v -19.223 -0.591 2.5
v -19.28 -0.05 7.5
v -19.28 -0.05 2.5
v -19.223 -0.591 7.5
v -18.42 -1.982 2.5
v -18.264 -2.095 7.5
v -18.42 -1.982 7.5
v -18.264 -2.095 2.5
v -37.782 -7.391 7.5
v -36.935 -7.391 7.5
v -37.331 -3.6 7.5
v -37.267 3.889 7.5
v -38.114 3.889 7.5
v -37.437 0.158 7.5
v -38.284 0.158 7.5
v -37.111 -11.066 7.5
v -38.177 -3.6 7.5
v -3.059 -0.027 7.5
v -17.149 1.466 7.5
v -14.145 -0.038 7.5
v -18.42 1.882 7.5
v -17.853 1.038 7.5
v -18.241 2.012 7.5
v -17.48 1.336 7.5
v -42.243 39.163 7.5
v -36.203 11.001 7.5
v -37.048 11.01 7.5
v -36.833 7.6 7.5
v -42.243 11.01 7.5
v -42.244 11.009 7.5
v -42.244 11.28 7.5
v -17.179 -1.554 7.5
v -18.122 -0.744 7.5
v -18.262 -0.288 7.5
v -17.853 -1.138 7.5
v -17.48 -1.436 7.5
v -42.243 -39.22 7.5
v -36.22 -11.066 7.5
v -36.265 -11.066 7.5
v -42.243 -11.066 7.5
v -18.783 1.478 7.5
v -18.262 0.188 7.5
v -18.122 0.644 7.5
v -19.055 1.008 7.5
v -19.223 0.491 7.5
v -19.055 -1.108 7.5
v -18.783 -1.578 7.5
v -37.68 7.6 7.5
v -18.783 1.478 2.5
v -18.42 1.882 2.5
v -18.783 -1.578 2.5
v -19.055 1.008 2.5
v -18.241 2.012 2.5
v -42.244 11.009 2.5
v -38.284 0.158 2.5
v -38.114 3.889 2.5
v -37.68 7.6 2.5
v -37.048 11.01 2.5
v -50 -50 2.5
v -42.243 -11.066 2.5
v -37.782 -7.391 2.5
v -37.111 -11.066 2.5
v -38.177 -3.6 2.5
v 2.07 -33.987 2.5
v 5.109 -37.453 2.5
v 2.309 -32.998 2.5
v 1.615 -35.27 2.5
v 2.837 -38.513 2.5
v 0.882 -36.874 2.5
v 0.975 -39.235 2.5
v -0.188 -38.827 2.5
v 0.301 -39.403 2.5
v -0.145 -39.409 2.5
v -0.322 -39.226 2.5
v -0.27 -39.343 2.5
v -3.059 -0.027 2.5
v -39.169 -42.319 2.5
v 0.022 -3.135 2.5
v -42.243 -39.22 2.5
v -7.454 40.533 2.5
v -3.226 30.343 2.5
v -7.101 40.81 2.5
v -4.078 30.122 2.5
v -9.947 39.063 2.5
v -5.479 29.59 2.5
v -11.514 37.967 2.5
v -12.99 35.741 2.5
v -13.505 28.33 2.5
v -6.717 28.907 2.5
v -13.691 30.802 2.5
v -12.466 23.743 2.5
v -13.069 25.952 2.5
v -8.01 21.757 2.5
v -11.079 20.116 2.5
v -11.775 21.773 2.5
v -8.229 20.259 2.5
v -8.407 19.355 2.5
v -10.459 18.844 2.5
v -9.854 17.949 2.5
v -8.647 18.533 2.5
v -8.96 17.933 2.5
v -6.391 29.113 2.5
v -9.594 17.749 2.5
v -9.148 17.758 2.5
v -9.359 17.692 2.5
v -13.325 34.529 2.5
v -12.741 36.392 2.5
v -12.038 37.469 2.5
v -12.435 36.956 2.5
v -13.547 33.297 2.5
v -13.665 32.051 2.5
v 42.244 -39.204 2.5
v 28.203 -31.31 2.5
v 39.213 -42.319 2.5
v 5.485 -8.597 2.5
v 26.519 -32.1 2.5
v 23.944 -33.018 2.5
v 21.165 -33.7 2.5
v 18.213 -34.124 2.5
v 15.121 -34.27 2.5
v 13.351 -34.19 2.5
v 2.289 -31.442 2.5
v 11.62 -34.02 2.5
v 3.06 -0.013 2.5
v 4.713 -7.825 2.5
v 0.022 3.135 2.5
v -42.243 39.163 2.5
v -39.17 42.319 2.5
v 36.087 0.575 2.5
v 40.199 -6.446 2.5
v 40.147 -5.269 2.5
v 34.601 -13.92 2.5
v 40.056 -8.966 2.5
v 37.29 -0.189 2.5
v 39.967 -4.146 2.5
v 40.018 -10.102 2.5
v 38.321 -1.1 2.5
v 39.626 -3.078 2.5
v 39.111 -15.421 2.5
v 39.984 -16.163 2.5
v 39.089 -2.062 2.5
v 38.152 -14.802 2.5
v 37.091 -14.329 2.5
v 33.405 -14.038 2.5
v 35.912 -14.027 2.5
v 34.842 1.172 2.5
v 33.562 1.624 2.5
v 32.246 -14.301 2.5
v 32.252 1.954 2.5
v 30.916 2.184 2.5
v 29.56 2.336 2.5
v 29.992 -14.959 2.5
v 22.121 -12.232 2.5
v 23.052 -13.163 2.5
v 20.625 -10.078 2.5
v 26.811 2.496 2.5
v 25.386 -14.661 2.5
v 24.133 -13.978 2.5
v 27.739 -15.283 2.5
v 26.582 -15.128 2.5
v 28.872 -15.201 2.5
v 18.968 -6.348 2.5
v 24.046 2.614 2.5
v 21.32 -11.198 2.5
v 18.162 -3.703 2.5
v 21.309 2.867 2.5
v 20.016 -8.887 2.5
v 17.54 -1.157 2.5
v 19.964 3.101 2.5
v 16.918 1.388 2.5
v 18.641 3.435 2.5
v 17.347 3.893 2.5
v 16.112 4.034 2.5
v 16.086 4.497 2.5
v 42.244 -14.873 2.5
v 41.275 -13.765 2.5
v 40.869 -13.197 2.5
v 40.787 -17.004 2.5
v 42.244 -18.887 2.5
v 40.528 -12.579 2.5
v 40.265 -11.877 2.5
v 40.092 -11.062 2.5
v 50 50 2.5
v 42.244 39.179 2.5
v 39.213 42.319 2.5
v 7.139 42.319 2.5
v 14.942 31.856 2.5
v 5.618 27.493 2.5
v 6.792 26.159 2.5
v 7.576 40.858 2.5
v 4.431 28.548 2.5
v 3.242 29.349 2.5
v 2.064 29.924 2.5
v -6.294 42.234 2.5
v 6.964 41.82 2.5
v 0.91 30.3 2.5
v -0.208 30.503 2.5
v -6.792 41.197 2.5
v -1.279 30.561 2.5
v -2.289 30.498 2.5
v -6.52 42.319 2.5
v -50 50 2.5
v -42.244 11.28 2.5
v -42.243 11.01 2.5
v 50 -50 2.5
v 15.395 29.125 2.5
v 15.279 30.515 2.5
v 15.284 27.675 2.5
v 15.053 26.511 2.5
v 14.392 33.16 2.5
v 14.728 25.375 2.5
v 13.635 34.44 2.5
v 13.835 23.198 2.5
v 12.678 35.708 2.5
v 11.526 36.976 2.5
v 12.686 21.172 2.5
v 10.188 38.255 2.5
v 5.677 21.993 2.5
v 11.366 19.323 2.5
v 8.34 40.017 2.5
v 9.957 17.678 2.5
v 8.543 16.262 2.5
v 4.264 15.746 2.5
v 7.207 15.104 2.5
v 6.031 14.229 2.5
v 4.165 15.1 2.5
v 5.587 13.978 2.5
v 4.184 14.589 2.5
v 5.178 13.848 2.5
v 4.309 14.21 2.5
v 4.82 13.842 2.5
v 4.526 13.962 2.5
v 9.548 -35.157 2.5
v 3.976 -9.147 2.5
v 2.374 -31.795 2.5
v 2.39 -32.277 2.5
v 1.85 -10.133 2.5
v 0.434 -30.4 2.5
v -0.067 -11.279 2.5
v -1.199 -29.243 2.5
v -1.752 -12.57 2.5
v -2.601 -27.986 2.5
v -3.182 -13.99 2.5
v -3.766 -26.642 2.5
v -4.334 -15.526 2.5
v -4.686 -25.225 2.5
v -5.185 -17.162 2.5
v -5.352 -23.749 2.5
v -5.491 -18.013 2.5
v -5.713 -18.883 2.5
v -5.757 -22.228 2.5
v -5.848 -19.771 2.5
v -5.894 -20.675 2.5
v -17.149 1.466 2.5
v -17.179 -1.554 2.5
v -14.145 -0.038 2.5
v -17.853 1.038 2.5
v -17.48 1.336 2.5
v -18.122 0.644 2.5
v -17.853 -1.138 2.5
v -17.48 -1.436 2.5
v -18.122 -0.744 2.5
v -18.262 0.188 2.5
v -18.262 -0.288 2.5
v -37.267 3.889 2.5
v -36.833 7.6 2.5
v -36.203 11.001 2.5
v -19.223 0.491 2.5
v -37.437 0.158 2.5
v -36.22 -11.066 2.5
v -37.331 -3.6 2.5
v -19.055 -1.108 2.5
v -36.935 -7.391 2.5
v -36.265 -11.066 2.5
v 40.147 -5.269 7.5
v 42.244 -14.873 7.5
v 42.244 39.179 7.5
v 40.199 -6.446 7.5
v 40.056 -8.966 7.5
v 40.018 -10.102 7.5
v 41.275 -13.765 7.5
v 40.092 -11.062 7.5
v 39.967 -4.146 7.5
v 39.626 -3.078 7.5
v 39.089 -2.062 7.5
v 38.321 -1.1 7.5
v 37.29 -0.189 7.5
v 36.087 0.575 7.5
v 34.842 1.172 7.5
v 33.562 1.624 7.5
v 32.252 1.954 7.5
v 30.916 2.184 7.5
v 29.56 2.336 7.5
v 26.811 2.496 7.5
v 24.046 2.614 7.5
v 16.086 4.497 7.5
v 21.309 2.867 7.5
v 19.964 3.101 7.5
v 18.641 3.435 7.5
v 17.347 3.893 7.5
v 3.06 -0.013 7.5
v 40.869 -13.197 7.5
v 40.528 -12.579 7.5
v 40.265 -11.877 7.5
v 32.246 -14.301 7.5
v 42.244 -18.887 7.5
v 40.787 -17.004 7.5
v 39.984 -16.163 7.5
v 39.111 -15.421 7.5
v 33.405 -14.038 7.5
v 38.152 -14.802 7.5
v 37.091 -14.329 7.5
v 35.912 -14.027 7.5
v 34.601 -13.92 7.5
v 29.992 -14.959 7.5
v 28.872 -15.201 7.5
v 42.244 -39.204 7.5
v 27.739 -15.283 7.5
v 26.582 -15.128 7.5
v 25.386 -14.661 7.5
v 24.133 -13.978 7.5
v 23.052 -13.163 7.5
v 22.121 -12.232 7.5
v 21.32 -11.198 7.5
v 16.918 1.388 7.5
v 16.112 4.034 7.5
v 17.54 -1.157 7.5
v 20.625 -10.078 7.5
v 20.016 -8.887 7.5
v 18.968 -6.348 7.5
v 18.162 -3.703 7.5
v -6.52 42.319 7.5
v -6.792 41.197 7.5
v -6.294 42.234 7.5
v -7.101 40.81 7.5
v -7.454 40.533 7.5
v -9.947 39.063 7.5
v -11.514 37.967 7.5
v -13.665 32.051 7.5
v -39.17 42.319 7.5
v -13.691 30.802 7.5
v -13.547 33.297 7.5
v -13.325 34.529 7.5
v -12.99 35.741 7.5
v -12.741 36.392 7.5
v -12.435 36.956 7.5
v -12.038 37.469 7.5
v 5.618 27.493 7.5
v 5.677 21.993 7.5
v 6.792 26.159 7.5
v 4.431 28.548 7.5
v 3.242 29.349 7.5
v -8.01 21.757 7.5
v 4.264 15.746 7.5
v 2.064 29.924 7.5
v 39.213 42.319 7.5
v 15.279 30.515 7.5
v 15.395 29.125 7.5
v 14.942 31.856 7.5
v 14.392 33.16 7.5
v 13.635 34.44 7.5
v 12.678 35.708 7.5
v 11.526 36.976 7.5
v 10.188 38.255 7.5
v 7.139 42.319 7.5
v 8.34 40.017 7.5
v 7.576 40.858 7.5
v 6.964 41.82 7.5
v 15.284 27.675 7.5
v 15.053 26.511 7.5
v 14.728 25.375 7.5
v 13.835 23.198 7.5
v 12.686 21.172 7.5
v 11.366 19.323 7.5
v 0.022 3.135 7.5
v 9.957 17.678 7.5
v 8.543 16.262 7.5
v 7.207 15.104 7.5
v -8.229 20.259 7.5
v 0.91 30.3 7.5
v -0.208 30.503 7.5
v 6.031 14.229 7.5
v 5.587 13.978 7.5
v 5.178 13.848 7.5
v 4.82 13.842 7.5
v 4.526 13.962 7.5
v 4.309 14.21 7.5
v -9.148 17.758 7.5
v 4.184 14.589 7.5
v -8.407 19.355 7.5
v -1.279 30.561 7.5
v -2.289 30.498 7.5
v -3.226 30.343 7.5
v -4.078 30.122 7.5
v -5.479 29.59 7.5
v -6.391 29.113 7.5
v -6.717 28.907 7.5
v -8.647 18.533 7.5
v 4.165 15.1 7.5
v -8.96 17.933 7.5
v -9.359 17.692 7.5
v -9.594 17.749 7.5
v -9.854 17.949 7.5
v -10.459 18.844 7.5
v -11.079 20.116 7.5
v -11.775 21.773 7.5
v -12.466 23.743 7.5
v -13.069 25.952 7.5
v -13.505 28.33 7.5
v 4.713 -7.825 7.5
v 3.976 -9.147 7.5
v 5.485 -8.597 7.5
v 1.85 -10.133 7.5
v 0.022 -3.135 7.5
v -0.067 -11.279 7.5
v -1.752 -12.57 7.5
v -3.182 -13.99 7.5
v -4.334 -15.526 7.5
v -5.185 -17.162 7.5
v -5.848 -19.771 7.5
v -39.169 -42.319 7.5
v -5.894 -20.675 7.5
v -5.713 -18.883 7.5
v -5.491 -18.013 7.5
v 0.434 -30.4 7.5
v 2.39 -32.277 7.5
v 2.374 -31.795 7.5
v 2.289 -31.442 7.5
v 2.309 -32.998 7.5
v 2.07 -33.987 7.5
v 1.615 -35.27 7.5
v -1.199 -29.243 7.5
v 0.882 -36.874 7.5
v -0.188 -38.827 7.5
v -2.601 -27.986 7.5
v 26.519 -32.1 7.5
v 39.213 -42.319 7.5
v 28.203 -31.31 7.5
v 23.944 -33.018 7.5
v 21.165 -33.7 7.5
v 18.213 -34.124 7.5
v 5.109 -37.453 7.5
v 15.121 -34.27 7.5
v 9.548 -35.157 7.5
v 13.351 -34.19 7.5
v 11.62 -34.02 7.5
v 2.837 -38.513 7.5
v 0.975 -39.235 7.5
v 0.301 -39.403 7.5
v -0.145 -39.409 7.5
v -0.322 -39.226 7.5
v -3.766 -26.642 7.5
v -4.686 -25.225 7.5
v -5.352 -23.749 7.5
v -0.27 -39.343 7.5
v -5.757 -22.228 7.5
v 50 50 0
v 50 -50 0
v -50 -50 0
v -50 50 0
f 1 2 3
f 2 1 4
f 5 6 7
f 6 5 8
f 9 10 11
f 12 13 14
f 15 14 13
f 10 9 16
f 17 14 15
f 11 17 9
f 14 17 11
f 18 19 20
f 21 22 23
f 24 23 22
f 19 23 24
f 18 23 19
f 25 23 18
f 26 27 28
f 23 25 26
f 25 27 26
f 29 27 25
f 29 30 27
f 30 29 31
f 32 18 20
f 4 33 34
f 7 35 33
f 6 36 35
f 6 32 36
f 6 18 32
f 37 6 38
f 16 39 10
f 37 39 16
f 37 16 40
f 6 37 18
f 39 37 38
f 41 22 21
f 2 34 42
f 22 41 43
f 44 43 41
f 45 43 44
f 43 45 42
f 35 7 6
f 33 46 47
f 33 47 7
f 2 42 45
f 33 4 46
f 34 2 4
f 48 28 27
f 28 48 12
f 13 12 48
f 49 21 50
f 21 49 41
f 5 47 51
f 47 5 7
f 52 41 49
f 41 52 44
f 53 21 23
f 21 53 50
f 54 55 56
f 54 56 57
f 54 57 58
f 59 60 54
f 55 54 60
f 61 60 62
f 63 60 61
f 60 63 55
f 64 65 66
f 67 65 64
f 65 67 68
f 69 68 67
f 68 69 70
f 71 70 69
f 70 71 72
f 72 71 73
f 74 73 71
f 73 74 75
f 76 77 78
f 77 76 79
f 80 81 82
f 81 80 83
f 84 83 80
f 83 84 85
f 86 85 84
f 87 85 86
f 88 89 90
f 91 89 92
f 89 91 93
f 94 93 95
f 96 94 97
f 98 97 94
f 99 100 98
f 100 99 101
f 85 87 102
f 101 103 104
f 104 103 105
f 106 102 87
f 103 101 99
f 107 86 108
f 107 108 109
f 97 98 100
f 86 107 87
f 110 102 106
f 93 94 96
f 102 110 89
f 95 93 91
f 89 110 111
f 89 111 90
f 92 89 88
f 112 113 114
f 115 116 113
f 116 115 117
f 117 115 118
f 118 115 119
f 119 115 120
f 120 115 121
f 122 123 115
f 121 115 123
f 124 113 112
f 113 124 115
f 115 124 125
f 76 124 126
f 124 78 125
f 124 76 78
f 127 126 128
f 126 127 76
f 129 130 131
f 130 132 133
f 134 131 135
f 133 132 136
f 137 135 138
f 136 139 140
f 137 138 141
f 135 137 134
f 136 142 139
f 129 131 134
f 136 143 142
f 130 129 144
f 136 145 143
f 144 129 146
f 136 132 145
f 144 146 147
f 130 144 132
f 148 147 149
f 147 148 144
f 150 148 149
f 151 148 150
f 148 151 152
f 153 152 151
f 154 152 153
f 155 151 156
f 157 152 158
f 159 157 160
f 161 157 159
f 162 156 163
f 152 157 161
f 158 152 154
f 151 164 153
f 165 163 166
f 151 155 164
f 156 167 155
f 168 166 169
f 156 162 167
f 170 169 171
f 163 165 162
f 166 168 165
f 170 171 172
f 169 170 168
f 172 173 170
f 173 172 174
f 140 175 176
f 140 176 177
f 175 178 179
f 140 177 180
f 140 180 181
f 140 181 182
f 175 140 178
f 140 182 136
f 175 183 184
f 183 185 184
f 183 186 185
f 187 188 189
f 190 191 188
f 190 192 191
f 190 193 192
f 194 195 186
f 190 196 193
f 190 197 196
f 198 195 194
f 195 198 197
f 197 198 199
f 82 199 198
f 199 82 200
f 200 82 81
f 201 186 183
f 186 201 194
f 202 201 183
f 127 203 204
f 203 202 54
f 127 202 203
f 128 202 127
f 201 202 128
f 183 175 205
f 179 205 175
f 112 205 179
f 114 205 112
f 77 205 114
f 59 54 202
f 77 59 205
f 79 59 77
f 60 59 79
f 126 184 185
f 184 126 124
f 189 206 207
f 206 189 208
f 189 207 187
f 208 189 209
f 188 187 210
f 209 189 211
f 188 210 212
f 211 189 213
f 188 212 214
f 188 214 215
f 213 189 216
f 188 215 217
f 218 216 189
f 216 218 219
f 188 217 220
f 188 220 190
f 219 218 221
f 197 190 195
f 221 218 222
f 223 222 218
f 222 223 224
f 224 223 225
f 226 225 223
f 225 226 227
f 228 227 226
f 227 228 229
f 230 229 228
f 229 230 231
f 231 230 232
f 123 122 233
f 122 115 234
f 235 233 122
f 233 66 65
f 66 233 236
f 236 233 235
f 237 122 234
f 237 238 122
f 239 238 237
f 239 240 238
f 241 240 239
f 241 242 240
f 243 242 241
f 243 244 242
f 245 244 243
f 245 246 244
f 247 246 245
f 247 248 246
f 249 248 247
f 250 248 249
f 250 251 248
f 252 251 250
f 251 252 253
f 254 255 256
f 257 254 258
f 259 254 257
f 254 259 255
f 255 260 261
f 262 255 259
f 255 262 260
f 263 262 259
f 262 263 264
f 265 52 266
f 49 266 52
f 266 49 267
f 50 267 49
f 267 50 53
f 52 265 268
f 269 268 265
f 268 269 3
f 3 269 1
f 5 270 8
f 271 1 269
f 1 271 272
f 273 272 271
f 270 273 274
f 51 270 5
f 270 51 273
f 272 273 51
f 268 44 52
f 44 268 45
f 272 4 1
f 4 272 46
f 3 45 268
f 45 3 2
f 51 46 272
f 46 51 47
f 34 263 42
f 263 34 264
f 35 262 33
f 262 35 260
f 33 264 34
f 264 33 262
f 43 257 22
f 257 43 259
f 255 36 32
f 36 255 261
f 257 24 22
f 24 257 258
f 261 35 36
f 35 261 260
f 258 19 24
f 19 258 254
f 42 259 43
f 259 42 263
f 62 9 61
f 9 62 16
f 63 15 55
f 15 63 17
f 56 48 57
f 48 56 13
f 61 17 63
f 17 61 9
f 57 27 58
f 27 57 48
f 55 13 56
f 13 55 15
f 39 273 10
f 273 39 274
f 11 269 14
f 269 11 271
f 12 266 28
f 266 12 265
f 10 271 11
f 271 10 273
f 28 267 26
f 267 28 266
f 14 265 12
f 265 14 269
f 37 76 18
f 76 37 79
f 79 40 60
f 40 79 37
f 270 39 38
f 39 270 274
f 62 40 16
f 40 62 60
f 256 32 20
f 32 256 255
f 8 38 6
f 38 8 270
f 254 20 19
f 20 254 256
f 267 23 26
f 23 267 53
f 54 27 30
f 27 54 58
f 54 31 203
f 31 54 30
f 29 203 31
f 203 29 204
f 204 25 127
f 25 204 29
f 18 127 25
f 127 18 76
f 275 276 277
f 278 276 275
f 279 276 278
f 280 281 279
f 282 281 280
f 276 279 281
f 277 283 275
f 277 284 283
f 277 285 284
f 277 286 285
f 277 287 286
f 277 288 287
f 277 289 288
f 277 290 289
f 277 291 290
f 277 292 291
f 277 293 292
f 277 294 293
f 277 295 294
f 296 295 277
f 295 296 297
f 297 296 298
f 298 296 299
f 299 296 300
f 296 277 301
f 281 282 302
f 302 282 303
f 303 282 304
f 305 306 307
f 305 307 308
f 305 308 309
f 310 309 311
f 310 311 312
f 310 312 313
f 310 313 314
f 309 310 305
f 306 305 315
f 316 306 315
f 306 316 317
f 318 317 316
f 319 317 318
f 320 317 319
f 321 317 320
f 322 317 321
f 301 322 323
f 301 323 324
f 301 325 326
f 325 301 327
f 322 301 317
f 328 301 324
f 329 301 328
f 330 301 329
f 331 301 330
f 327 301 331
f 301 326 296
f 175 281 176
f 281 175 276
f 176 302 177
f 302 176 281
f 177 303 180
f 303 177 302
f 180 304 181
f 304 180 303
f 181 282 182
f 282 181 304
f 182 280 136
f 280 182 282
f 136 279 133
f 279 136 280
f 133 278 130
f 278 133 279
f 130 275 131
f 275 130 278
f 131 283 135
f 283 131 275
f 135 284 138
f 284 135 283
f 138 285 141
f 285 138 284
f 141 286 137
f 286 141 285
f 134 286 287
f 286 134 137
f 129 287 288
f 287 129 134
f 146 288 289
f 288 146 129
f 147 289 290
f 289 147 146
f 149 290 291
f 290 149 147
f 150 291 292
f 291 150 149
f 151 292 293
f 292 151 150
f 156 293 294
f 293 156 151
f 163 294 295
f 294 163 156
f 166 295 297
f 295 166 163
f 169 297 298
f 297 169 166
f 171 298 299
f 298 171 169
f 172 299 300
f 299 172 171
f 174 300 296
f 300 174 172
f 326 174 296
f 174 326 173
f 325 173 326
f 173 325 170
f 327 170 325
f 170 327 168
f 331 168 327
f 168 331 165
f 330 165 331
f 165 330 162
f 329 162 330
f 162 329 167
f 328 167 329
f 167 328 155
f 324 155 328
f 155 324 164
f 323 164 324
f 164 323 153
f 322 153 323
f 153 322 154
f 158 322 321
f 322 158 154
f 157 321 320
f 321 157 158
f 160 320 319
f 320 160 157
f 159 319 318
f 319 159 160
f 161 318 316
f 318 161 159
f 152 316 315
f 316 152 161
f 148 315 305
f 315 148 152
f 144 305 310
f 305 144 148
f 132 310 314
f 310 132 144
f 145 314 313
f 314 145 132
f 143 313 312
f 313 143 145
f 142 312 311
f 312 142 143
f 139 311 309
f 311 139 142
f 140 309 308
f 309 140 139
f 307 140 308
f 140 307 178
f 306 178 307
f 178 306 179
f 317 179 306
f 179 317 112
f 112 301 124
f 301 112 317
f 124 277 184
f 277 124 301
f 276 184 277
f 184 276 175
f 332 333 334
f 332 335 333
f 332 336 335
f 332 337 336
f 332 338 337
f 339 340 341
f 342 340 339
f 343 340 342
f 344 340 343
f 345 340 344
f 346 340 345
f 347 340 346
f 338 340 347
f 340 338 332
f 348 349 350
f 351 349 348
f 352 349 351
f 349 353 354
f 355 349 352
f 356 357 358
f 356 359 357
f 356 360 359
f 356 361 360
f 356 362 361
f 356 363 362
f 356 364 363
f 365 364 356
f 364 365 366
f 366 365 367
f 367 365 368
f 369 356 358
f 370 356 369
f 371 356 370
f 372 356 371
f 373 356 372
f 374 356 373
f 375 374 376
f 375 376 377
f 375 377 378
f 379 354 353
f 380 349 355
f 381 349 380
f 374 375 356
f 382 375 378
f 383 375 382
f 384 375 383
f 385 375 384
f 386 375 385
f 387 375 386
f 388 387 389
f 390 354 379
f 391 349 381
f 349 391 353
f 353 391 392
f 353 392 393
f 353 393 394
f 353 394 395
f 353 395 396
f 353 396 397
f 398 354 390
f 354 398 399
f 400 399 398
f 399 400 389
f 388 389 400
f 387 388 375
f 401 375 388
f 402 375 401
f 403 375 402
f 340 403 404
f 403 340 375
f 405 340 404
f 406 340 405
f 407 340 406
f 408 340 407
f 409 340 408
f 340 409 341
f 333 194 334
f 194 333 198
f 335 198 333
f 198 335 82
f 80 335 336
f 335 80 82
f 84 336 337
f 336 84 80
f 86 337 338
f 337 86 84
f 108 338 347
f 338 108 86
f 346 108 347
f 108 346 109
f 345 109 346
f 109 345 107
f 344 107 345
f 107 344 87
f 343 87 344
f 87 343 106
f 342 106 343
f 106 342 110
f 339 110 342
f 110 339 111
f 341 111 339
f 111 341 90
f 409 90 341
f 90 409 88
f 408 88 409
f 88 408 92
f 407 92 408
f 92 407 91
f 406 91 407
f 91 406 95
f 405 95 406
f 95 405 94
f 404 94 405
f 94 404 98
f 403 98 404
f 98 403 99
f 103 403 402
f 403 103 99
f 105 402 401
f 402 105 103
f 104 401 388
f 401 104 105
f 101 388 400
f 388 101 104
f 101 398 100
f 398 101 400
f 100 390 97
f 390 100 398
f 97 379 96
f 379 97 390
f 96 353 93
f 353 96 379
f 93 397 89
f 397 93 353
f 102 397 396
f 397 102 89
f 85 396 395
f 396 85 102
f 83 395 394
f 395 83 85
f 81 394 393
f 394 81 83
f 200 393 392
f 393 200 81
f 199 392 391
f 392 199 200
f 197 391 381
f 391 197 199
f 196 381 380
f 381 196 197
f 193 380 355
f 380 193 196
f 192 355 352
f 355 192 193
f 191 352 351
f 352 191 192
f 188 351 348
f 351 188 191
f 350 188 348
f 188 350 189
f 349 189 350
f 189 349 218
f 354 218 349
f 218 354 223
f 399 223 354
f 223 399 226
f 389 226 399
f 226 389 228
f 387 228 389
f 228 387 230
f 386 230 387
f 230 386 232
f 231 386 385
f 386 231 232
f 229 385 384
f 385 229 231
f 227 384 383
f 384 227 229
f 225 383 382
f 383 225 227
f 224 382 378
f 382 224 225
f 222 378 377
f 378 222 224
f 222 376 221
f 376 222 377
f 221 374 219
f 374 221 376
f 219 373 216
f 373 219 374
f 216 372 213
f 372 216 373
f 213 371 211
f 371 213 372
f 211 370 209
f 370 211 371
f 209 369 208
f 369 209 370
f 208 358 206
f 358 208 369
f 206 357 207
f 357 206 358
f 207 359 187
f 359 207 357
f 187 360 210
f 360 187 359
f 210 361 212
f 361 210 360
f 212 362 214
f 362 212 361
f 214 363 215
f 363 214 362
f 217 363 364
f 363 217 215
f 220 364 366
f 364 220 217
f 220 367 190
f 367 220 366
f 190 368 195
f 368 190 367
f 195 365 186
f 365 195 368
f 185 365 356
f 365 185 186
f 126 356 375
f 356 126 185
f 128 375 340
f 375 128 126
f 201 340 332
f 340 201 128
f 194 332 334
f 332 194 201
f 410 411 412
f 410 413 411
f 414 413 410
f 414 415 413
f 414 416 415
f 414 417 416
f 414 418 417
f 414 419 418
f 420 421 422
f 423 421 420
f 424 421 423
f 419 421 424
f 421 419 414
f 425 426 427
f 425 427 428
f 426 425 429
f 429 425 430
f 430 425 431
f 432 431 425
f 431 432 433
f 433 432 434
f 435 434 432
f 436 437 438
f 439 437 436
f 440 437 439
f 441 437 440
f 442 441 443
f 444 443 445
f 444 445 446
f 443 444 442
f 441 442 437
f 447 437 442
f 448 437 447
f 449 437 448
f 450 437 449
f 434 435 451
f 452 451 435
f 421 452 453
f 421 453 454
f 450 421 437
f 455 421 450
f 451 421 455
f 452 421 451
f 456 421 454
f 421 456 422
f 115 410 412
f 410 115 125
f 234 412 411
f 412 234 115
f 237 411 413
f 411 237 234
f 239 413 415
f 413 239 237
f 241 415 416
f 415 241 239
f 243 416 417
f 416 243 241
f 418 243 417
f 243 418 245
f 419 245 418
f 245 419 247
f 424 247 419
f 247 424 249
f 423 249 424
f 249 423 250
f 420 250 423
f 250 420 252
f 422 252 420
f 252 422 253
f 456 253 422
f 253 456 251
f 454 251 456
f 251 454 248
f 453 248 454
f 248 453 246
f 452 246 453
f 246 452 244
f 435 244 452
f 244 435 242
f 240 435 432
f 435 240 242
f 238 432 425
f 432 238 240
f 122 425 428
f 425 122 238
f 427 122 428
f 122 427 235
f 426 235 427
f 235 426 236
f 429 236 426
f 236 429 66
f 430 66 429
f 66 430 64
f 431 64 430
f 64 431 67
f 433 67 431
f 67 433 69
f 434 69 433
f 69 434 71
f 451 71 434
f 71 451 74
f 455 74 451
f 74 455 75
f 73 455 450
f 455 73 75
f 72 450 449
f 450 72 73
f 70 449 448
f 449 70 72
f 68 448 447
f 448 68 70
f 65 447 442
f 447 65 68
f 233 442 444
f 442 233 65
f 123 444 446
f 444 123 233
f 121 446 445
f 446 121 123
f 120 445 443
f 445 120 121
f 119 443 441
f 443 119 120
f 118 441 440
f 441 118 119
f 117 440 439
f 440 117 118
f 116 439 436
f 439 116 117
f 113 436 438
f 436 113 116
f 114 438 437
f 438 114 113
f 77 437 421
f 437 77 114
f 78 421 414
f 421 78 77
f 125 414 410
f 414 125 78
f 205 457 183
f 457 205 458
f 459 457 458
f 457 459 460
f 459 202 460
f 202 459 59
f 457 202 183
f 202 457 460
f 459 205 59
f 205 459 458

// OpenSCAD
// Module names are of the form poly_<inkscape-path-id>().  As a result,
// you can associate a polygon in this OpenSCAD program with the corresponding
// SVG element in the Inkscape document by looking for the XML element with
// the attribute id="inkscape-path-id".

// fudge value is used to ensure that subtracted solids are a tad taller
// in the z dimension than the polygon being subtracted from.  This helps
// keep the resulting .stl file manifold.
fudge = 0.1;
height = 5;

module poly_sustainability(h)
{
  scale([25.4/90, -25.4/90, 1]) union()
  {
    linear_extrude(height=h)
      polygon([[119.059500,49.321938],[114.820081,49.739379],[110.714930,50.672563],[102.729188,53.003813],[98.759476,53.860707],[94.745789,54.151000],[90.643567,53.604105],[86.408250,51.949438],[81.966543,49.529252],[78.135691,46.642016],[74.838658,43.340990],[71.998406,39.679438],[69.537901,35.710619],[67.380105,31.487797],[63.664500,22.493188],[60.810105,13.119672],[58.605281,4.101000],[56.400691,-4.918141],[53.547000,-14.293062],[53.454500,-15.934312],[57.922292,-13.795368],[62.508553,-12.172638],[67.194408,-10.986966],[71.960984,-10.159195],[81.660799,-9.260733],[91.457000,-8.844000],[101.198592,-8.275743],[106.001723,-7.736902],[110.734578,-6.922711],[115.378283,-5.754013],[119.913963,-4.151651],[124.322743,-2.036470],[128.585750,0.670688],[132.240567,3.896293],[134.959598,7.307172],[136.863619,10.905199],[138.073406,14.692250],[138.709737,18.670199],[138.893387,22.840922],[138.385750,31.768188],[138.252571,35.795016],[138.513758,39.196957],[139.129612,42.084943],[140.060437,44.569906],[141.266536,46.762780],[142.708211,48.774496],[146.139500,52.698188],[146.139500,-138.824312],[7.299500,0.045688],[146.139500,138.911938],[146.139500,66.921938],[140.978191,60.251137],[138.133609,57.271657],[135.039344,54.642406],[131.640098,52.448097],[127.880574,50.773441],[123.705474,49.703151]]);
  }
}

module poly_make(h)
{
  scale([25.4/90, -25.4/90, 1]) union()
  {
    linear_extrude(height=h)
      polygon([[25.294875,-146.406813],[138.944875,-146.406813],[0.078625,-7.564312],[-138.790125,-146.406813],[-23.101375,-146.406813],[-22.301375,-146.104312],[-24.065906,-142.430094],[-25.161512,-141.058512],[-26.412625,-140.076813],[-35.245926,-134.869059],[-40.798094,-130.985406],[-42.653897,-129.220306],[-44.061590,-127.402457],[-45.145230,-125.403934],[-46.028875,-123.096813],[-47.214939,-118.805053],[-48.000101,-114.436529],[-48.420362,-110.023401],[-48.511727,-105.597828],[-47.851771,-96.837994],[-46.308250,-88.414313],[-44.169183,-80.584068],[-41.722586,-73.604547],[-39.256478,-67.733033],[-37.058875,-63.226813],[-34.916651,-60.055699],[-33.993017,-59.347848],[-33.160691,-59.143141],[-32.414419,-59.380084],[-31.748941,-59.997184],[-30.639344,-62.125875],[-29.789844,-65.037262],[-29.158387,-68.239391],[-28.381375,-73.548063],[-23.801375,-98.883062],[-22.646038,-99.613863],[-19.412820,-101.301734],[-14.450911,-103.189879],[-11.430819,-103.972555],[-8.109500,-104.521500],[-4.530603,-104.742115],[-0.737776,-104.539801],[3.225331,-103.819957],[7.315070,-102.487984],[11.487793,-100.449283],[15.699851,-97.609254],[19.907594,-93.873297],[24.067375,-89.146813],[20.115500,-74.382906],[15.109875,-52.249313],[14.757270,-49.960501],[14.826613,-48.149449],[15.269111,-46.808290],[16.035969,-45.929156],[17.078393,-45.504183],[18.347590,-45.525504],[19.794765,-45.985252],[21.371125,-46.875563],[25.535231,-49.975470],[30.270070,-54.079586],[35.280827,-59.093722],[40.272687,-64.923688],[44.950837,-71.475294],[49.020461,-78.654352],[52.186745,-86.366671],[53.339005,-90.393370],[54.154875,-94.518062],[54.548017,-99.656607],[54.137121,-104.580172],[52.945610,-109.331588],[50.996906,-113.953688],[48.314433,-118.489303],[44.921613,-122.981266],[40.841870,-127.472408],[36.098625,-132.005563],[29.552375,-138.249469],[26.843039,-141.229684],[24.674875,-144.636812],[25.294875,-146.406813]]);
  }
}

module poly_creatitvity(h)
{
  union() {
    scale([25.4/90, -25.4/90, 1])
    {
      linear_extrude(height=h)
        polygon([[-146.139500,-39.966937],[-146.139500,-39.009437],[-124.800750,-39.011937],[-46.575750,0.133063],[-124.795750,39.211813],[-143.664500,39.211813],[-146.138250,39.211813],[-146.138250,138.968063],[-7.297000,0.096813],[-146.138250,-138.768187],[-146.138250,-39.011937]]);
    }

    difference() {
      translate([-15.68, -0.05, 0])
      cylinder(h=h, r=2.6, $fs=0.5);

      translate([-15.68, -0.05, -h/2])
      scale([1,1,2])
      cylinder(h=h, r=1.6, $fs=0.5);

      translate([-13.68, -0.05, -h/2])
      scale([1,1,2])
      cylinder(h=h, r=1.6, $fs=0.5);
    }
    poly_border(h);
  }
}

module poly_border(h)
{
  translate([0.3, 0, 0])
  scale([25.4/90, -25.4/90, 1])
  {
    difference() {
      scale([1, 1.2, 1])
      bow(h);

      translate([ 3, 0, -h/2])
      scale([1,1.2,2])
      bow(h);
    }
  }
}

module bow(h) {
  linear_extrude(height=h)
    polygon([[-125.332625,-44.244312],[-128.603252,-33.355375],[-131.030145,-22.440934],[-132.567847,-11.483456],[-133.170906,-0.465406],[-132.793868,10.630749],[-131.391277,21.822543],[-128.917681,33.127511],[-125.327625,44.563188]]);
}

module poly_tip(h)
{
  scale([25.4/90, -25.4/90, 1]) union()
  {
    linear_extrude(height=h)
      polygon([[-46.478250,0.159938],[-46.663282,1.994305],[-47.193973,3.703238],[-48.033716,5.250013],[-49.145906,6.597906],[-50.493936,7.710194],[-52.041199,8.550152],[-53.751089,9.081058],[-55.587000,9.266188],[-57.422444,9.081058],[-59.131883,8.550152],[-60.678724,7.710194],[-62.026375,6.597906],[-63.138245,5.250013],[-63.977742,3.703238],[-64.508274,1.994305],[-64.693250,0.159938],[-64.508274,-1.676081],[-63.977742,-3.386254],[-63.138245,-4.933917],[-62.026375,-6.282406],[-60.678724,-7.395055],[-59.131883,-8.235199],[-57.422444,-8.766173],[-55.587000,-8.951313],[-53.751089,-8.766173],[-52.041199,-8.235199],[-50.493936,-7.395055],[-49.145906,-6.282406],[-48.033716,-4.933917],[-47.193973,-3.386254],[-46.663282,-1.676081],[-46.478250,0.159938]]);
  }
}

module poly_social(h)
{
  scale([25.4/90, -25.4/90, 1]) union()
  {
    linear_extrude(height=h)
      polygon([[99.931125,107.398063],[93.964875,110.195563],[84.841145,113.449215],[74.992844,115.865094],[64.533996,117.369020],[53.578625,117.886813],[47.306281,117.601188],[41.173625,117.000563],[33.830168,121.030191],[18.104406,129.165719],[10.053447,132.920057],[3.453254,135.477105],[1.066606,136.075004],[-0.514058,136.095609],[-0.955969,135.860471],[-1.140973,135.446264],[-0.666375,134.034313],[3.124208,127.112831],[5.720871,121.427457],[7.335825,116.881644],[8.181281,113.378844],[8.469453,110.822508],[8.412551,109.116090],[8.112375,107.866813],[1.538410,104.172823],[-4.247234,100.074039],[-9.217371,95.619298],[-13.344812,90.857438],[-16.602371,85.837296],[-18.962859,80.607711],[-20.399090,75.217521],[-20.883875,69.715563],[-20.722091,66.512633],[-20.243042,63.365719],[-19.456886,60.281383],[-18.373777,57.266188],[-15.357334,51.469469],[-11.274969,46.028063],[-6.207935,40.994469],[-0.237488,36.421188],[6.555117,32.360719],[14.088625,28.865563],[19.436125,26.919313],[16.698625,24.183063],[0.078625,7.564313],[-138.788875,146.406813],[138.944875,146.406813],[99.931125,107.398063]]);
  }
}
module logo()
{
  union() {
    translate([1, 0, 0])
    poly_sustainability(height);

    translate([0, 1, 0])
    poly_make(height);

    translate([-1, 0, 0])
    poly_creatitvity(height);

    translate([0, -1, 0])
    poly_social(height);

    //cylinder(h=height/2, r=5, $fs=1);
  }
}

union() {
  translate([-50, -50, 0])
  cube([100, 100, height/2]);

  translate([0, 0, height/2])
  logo();
}
